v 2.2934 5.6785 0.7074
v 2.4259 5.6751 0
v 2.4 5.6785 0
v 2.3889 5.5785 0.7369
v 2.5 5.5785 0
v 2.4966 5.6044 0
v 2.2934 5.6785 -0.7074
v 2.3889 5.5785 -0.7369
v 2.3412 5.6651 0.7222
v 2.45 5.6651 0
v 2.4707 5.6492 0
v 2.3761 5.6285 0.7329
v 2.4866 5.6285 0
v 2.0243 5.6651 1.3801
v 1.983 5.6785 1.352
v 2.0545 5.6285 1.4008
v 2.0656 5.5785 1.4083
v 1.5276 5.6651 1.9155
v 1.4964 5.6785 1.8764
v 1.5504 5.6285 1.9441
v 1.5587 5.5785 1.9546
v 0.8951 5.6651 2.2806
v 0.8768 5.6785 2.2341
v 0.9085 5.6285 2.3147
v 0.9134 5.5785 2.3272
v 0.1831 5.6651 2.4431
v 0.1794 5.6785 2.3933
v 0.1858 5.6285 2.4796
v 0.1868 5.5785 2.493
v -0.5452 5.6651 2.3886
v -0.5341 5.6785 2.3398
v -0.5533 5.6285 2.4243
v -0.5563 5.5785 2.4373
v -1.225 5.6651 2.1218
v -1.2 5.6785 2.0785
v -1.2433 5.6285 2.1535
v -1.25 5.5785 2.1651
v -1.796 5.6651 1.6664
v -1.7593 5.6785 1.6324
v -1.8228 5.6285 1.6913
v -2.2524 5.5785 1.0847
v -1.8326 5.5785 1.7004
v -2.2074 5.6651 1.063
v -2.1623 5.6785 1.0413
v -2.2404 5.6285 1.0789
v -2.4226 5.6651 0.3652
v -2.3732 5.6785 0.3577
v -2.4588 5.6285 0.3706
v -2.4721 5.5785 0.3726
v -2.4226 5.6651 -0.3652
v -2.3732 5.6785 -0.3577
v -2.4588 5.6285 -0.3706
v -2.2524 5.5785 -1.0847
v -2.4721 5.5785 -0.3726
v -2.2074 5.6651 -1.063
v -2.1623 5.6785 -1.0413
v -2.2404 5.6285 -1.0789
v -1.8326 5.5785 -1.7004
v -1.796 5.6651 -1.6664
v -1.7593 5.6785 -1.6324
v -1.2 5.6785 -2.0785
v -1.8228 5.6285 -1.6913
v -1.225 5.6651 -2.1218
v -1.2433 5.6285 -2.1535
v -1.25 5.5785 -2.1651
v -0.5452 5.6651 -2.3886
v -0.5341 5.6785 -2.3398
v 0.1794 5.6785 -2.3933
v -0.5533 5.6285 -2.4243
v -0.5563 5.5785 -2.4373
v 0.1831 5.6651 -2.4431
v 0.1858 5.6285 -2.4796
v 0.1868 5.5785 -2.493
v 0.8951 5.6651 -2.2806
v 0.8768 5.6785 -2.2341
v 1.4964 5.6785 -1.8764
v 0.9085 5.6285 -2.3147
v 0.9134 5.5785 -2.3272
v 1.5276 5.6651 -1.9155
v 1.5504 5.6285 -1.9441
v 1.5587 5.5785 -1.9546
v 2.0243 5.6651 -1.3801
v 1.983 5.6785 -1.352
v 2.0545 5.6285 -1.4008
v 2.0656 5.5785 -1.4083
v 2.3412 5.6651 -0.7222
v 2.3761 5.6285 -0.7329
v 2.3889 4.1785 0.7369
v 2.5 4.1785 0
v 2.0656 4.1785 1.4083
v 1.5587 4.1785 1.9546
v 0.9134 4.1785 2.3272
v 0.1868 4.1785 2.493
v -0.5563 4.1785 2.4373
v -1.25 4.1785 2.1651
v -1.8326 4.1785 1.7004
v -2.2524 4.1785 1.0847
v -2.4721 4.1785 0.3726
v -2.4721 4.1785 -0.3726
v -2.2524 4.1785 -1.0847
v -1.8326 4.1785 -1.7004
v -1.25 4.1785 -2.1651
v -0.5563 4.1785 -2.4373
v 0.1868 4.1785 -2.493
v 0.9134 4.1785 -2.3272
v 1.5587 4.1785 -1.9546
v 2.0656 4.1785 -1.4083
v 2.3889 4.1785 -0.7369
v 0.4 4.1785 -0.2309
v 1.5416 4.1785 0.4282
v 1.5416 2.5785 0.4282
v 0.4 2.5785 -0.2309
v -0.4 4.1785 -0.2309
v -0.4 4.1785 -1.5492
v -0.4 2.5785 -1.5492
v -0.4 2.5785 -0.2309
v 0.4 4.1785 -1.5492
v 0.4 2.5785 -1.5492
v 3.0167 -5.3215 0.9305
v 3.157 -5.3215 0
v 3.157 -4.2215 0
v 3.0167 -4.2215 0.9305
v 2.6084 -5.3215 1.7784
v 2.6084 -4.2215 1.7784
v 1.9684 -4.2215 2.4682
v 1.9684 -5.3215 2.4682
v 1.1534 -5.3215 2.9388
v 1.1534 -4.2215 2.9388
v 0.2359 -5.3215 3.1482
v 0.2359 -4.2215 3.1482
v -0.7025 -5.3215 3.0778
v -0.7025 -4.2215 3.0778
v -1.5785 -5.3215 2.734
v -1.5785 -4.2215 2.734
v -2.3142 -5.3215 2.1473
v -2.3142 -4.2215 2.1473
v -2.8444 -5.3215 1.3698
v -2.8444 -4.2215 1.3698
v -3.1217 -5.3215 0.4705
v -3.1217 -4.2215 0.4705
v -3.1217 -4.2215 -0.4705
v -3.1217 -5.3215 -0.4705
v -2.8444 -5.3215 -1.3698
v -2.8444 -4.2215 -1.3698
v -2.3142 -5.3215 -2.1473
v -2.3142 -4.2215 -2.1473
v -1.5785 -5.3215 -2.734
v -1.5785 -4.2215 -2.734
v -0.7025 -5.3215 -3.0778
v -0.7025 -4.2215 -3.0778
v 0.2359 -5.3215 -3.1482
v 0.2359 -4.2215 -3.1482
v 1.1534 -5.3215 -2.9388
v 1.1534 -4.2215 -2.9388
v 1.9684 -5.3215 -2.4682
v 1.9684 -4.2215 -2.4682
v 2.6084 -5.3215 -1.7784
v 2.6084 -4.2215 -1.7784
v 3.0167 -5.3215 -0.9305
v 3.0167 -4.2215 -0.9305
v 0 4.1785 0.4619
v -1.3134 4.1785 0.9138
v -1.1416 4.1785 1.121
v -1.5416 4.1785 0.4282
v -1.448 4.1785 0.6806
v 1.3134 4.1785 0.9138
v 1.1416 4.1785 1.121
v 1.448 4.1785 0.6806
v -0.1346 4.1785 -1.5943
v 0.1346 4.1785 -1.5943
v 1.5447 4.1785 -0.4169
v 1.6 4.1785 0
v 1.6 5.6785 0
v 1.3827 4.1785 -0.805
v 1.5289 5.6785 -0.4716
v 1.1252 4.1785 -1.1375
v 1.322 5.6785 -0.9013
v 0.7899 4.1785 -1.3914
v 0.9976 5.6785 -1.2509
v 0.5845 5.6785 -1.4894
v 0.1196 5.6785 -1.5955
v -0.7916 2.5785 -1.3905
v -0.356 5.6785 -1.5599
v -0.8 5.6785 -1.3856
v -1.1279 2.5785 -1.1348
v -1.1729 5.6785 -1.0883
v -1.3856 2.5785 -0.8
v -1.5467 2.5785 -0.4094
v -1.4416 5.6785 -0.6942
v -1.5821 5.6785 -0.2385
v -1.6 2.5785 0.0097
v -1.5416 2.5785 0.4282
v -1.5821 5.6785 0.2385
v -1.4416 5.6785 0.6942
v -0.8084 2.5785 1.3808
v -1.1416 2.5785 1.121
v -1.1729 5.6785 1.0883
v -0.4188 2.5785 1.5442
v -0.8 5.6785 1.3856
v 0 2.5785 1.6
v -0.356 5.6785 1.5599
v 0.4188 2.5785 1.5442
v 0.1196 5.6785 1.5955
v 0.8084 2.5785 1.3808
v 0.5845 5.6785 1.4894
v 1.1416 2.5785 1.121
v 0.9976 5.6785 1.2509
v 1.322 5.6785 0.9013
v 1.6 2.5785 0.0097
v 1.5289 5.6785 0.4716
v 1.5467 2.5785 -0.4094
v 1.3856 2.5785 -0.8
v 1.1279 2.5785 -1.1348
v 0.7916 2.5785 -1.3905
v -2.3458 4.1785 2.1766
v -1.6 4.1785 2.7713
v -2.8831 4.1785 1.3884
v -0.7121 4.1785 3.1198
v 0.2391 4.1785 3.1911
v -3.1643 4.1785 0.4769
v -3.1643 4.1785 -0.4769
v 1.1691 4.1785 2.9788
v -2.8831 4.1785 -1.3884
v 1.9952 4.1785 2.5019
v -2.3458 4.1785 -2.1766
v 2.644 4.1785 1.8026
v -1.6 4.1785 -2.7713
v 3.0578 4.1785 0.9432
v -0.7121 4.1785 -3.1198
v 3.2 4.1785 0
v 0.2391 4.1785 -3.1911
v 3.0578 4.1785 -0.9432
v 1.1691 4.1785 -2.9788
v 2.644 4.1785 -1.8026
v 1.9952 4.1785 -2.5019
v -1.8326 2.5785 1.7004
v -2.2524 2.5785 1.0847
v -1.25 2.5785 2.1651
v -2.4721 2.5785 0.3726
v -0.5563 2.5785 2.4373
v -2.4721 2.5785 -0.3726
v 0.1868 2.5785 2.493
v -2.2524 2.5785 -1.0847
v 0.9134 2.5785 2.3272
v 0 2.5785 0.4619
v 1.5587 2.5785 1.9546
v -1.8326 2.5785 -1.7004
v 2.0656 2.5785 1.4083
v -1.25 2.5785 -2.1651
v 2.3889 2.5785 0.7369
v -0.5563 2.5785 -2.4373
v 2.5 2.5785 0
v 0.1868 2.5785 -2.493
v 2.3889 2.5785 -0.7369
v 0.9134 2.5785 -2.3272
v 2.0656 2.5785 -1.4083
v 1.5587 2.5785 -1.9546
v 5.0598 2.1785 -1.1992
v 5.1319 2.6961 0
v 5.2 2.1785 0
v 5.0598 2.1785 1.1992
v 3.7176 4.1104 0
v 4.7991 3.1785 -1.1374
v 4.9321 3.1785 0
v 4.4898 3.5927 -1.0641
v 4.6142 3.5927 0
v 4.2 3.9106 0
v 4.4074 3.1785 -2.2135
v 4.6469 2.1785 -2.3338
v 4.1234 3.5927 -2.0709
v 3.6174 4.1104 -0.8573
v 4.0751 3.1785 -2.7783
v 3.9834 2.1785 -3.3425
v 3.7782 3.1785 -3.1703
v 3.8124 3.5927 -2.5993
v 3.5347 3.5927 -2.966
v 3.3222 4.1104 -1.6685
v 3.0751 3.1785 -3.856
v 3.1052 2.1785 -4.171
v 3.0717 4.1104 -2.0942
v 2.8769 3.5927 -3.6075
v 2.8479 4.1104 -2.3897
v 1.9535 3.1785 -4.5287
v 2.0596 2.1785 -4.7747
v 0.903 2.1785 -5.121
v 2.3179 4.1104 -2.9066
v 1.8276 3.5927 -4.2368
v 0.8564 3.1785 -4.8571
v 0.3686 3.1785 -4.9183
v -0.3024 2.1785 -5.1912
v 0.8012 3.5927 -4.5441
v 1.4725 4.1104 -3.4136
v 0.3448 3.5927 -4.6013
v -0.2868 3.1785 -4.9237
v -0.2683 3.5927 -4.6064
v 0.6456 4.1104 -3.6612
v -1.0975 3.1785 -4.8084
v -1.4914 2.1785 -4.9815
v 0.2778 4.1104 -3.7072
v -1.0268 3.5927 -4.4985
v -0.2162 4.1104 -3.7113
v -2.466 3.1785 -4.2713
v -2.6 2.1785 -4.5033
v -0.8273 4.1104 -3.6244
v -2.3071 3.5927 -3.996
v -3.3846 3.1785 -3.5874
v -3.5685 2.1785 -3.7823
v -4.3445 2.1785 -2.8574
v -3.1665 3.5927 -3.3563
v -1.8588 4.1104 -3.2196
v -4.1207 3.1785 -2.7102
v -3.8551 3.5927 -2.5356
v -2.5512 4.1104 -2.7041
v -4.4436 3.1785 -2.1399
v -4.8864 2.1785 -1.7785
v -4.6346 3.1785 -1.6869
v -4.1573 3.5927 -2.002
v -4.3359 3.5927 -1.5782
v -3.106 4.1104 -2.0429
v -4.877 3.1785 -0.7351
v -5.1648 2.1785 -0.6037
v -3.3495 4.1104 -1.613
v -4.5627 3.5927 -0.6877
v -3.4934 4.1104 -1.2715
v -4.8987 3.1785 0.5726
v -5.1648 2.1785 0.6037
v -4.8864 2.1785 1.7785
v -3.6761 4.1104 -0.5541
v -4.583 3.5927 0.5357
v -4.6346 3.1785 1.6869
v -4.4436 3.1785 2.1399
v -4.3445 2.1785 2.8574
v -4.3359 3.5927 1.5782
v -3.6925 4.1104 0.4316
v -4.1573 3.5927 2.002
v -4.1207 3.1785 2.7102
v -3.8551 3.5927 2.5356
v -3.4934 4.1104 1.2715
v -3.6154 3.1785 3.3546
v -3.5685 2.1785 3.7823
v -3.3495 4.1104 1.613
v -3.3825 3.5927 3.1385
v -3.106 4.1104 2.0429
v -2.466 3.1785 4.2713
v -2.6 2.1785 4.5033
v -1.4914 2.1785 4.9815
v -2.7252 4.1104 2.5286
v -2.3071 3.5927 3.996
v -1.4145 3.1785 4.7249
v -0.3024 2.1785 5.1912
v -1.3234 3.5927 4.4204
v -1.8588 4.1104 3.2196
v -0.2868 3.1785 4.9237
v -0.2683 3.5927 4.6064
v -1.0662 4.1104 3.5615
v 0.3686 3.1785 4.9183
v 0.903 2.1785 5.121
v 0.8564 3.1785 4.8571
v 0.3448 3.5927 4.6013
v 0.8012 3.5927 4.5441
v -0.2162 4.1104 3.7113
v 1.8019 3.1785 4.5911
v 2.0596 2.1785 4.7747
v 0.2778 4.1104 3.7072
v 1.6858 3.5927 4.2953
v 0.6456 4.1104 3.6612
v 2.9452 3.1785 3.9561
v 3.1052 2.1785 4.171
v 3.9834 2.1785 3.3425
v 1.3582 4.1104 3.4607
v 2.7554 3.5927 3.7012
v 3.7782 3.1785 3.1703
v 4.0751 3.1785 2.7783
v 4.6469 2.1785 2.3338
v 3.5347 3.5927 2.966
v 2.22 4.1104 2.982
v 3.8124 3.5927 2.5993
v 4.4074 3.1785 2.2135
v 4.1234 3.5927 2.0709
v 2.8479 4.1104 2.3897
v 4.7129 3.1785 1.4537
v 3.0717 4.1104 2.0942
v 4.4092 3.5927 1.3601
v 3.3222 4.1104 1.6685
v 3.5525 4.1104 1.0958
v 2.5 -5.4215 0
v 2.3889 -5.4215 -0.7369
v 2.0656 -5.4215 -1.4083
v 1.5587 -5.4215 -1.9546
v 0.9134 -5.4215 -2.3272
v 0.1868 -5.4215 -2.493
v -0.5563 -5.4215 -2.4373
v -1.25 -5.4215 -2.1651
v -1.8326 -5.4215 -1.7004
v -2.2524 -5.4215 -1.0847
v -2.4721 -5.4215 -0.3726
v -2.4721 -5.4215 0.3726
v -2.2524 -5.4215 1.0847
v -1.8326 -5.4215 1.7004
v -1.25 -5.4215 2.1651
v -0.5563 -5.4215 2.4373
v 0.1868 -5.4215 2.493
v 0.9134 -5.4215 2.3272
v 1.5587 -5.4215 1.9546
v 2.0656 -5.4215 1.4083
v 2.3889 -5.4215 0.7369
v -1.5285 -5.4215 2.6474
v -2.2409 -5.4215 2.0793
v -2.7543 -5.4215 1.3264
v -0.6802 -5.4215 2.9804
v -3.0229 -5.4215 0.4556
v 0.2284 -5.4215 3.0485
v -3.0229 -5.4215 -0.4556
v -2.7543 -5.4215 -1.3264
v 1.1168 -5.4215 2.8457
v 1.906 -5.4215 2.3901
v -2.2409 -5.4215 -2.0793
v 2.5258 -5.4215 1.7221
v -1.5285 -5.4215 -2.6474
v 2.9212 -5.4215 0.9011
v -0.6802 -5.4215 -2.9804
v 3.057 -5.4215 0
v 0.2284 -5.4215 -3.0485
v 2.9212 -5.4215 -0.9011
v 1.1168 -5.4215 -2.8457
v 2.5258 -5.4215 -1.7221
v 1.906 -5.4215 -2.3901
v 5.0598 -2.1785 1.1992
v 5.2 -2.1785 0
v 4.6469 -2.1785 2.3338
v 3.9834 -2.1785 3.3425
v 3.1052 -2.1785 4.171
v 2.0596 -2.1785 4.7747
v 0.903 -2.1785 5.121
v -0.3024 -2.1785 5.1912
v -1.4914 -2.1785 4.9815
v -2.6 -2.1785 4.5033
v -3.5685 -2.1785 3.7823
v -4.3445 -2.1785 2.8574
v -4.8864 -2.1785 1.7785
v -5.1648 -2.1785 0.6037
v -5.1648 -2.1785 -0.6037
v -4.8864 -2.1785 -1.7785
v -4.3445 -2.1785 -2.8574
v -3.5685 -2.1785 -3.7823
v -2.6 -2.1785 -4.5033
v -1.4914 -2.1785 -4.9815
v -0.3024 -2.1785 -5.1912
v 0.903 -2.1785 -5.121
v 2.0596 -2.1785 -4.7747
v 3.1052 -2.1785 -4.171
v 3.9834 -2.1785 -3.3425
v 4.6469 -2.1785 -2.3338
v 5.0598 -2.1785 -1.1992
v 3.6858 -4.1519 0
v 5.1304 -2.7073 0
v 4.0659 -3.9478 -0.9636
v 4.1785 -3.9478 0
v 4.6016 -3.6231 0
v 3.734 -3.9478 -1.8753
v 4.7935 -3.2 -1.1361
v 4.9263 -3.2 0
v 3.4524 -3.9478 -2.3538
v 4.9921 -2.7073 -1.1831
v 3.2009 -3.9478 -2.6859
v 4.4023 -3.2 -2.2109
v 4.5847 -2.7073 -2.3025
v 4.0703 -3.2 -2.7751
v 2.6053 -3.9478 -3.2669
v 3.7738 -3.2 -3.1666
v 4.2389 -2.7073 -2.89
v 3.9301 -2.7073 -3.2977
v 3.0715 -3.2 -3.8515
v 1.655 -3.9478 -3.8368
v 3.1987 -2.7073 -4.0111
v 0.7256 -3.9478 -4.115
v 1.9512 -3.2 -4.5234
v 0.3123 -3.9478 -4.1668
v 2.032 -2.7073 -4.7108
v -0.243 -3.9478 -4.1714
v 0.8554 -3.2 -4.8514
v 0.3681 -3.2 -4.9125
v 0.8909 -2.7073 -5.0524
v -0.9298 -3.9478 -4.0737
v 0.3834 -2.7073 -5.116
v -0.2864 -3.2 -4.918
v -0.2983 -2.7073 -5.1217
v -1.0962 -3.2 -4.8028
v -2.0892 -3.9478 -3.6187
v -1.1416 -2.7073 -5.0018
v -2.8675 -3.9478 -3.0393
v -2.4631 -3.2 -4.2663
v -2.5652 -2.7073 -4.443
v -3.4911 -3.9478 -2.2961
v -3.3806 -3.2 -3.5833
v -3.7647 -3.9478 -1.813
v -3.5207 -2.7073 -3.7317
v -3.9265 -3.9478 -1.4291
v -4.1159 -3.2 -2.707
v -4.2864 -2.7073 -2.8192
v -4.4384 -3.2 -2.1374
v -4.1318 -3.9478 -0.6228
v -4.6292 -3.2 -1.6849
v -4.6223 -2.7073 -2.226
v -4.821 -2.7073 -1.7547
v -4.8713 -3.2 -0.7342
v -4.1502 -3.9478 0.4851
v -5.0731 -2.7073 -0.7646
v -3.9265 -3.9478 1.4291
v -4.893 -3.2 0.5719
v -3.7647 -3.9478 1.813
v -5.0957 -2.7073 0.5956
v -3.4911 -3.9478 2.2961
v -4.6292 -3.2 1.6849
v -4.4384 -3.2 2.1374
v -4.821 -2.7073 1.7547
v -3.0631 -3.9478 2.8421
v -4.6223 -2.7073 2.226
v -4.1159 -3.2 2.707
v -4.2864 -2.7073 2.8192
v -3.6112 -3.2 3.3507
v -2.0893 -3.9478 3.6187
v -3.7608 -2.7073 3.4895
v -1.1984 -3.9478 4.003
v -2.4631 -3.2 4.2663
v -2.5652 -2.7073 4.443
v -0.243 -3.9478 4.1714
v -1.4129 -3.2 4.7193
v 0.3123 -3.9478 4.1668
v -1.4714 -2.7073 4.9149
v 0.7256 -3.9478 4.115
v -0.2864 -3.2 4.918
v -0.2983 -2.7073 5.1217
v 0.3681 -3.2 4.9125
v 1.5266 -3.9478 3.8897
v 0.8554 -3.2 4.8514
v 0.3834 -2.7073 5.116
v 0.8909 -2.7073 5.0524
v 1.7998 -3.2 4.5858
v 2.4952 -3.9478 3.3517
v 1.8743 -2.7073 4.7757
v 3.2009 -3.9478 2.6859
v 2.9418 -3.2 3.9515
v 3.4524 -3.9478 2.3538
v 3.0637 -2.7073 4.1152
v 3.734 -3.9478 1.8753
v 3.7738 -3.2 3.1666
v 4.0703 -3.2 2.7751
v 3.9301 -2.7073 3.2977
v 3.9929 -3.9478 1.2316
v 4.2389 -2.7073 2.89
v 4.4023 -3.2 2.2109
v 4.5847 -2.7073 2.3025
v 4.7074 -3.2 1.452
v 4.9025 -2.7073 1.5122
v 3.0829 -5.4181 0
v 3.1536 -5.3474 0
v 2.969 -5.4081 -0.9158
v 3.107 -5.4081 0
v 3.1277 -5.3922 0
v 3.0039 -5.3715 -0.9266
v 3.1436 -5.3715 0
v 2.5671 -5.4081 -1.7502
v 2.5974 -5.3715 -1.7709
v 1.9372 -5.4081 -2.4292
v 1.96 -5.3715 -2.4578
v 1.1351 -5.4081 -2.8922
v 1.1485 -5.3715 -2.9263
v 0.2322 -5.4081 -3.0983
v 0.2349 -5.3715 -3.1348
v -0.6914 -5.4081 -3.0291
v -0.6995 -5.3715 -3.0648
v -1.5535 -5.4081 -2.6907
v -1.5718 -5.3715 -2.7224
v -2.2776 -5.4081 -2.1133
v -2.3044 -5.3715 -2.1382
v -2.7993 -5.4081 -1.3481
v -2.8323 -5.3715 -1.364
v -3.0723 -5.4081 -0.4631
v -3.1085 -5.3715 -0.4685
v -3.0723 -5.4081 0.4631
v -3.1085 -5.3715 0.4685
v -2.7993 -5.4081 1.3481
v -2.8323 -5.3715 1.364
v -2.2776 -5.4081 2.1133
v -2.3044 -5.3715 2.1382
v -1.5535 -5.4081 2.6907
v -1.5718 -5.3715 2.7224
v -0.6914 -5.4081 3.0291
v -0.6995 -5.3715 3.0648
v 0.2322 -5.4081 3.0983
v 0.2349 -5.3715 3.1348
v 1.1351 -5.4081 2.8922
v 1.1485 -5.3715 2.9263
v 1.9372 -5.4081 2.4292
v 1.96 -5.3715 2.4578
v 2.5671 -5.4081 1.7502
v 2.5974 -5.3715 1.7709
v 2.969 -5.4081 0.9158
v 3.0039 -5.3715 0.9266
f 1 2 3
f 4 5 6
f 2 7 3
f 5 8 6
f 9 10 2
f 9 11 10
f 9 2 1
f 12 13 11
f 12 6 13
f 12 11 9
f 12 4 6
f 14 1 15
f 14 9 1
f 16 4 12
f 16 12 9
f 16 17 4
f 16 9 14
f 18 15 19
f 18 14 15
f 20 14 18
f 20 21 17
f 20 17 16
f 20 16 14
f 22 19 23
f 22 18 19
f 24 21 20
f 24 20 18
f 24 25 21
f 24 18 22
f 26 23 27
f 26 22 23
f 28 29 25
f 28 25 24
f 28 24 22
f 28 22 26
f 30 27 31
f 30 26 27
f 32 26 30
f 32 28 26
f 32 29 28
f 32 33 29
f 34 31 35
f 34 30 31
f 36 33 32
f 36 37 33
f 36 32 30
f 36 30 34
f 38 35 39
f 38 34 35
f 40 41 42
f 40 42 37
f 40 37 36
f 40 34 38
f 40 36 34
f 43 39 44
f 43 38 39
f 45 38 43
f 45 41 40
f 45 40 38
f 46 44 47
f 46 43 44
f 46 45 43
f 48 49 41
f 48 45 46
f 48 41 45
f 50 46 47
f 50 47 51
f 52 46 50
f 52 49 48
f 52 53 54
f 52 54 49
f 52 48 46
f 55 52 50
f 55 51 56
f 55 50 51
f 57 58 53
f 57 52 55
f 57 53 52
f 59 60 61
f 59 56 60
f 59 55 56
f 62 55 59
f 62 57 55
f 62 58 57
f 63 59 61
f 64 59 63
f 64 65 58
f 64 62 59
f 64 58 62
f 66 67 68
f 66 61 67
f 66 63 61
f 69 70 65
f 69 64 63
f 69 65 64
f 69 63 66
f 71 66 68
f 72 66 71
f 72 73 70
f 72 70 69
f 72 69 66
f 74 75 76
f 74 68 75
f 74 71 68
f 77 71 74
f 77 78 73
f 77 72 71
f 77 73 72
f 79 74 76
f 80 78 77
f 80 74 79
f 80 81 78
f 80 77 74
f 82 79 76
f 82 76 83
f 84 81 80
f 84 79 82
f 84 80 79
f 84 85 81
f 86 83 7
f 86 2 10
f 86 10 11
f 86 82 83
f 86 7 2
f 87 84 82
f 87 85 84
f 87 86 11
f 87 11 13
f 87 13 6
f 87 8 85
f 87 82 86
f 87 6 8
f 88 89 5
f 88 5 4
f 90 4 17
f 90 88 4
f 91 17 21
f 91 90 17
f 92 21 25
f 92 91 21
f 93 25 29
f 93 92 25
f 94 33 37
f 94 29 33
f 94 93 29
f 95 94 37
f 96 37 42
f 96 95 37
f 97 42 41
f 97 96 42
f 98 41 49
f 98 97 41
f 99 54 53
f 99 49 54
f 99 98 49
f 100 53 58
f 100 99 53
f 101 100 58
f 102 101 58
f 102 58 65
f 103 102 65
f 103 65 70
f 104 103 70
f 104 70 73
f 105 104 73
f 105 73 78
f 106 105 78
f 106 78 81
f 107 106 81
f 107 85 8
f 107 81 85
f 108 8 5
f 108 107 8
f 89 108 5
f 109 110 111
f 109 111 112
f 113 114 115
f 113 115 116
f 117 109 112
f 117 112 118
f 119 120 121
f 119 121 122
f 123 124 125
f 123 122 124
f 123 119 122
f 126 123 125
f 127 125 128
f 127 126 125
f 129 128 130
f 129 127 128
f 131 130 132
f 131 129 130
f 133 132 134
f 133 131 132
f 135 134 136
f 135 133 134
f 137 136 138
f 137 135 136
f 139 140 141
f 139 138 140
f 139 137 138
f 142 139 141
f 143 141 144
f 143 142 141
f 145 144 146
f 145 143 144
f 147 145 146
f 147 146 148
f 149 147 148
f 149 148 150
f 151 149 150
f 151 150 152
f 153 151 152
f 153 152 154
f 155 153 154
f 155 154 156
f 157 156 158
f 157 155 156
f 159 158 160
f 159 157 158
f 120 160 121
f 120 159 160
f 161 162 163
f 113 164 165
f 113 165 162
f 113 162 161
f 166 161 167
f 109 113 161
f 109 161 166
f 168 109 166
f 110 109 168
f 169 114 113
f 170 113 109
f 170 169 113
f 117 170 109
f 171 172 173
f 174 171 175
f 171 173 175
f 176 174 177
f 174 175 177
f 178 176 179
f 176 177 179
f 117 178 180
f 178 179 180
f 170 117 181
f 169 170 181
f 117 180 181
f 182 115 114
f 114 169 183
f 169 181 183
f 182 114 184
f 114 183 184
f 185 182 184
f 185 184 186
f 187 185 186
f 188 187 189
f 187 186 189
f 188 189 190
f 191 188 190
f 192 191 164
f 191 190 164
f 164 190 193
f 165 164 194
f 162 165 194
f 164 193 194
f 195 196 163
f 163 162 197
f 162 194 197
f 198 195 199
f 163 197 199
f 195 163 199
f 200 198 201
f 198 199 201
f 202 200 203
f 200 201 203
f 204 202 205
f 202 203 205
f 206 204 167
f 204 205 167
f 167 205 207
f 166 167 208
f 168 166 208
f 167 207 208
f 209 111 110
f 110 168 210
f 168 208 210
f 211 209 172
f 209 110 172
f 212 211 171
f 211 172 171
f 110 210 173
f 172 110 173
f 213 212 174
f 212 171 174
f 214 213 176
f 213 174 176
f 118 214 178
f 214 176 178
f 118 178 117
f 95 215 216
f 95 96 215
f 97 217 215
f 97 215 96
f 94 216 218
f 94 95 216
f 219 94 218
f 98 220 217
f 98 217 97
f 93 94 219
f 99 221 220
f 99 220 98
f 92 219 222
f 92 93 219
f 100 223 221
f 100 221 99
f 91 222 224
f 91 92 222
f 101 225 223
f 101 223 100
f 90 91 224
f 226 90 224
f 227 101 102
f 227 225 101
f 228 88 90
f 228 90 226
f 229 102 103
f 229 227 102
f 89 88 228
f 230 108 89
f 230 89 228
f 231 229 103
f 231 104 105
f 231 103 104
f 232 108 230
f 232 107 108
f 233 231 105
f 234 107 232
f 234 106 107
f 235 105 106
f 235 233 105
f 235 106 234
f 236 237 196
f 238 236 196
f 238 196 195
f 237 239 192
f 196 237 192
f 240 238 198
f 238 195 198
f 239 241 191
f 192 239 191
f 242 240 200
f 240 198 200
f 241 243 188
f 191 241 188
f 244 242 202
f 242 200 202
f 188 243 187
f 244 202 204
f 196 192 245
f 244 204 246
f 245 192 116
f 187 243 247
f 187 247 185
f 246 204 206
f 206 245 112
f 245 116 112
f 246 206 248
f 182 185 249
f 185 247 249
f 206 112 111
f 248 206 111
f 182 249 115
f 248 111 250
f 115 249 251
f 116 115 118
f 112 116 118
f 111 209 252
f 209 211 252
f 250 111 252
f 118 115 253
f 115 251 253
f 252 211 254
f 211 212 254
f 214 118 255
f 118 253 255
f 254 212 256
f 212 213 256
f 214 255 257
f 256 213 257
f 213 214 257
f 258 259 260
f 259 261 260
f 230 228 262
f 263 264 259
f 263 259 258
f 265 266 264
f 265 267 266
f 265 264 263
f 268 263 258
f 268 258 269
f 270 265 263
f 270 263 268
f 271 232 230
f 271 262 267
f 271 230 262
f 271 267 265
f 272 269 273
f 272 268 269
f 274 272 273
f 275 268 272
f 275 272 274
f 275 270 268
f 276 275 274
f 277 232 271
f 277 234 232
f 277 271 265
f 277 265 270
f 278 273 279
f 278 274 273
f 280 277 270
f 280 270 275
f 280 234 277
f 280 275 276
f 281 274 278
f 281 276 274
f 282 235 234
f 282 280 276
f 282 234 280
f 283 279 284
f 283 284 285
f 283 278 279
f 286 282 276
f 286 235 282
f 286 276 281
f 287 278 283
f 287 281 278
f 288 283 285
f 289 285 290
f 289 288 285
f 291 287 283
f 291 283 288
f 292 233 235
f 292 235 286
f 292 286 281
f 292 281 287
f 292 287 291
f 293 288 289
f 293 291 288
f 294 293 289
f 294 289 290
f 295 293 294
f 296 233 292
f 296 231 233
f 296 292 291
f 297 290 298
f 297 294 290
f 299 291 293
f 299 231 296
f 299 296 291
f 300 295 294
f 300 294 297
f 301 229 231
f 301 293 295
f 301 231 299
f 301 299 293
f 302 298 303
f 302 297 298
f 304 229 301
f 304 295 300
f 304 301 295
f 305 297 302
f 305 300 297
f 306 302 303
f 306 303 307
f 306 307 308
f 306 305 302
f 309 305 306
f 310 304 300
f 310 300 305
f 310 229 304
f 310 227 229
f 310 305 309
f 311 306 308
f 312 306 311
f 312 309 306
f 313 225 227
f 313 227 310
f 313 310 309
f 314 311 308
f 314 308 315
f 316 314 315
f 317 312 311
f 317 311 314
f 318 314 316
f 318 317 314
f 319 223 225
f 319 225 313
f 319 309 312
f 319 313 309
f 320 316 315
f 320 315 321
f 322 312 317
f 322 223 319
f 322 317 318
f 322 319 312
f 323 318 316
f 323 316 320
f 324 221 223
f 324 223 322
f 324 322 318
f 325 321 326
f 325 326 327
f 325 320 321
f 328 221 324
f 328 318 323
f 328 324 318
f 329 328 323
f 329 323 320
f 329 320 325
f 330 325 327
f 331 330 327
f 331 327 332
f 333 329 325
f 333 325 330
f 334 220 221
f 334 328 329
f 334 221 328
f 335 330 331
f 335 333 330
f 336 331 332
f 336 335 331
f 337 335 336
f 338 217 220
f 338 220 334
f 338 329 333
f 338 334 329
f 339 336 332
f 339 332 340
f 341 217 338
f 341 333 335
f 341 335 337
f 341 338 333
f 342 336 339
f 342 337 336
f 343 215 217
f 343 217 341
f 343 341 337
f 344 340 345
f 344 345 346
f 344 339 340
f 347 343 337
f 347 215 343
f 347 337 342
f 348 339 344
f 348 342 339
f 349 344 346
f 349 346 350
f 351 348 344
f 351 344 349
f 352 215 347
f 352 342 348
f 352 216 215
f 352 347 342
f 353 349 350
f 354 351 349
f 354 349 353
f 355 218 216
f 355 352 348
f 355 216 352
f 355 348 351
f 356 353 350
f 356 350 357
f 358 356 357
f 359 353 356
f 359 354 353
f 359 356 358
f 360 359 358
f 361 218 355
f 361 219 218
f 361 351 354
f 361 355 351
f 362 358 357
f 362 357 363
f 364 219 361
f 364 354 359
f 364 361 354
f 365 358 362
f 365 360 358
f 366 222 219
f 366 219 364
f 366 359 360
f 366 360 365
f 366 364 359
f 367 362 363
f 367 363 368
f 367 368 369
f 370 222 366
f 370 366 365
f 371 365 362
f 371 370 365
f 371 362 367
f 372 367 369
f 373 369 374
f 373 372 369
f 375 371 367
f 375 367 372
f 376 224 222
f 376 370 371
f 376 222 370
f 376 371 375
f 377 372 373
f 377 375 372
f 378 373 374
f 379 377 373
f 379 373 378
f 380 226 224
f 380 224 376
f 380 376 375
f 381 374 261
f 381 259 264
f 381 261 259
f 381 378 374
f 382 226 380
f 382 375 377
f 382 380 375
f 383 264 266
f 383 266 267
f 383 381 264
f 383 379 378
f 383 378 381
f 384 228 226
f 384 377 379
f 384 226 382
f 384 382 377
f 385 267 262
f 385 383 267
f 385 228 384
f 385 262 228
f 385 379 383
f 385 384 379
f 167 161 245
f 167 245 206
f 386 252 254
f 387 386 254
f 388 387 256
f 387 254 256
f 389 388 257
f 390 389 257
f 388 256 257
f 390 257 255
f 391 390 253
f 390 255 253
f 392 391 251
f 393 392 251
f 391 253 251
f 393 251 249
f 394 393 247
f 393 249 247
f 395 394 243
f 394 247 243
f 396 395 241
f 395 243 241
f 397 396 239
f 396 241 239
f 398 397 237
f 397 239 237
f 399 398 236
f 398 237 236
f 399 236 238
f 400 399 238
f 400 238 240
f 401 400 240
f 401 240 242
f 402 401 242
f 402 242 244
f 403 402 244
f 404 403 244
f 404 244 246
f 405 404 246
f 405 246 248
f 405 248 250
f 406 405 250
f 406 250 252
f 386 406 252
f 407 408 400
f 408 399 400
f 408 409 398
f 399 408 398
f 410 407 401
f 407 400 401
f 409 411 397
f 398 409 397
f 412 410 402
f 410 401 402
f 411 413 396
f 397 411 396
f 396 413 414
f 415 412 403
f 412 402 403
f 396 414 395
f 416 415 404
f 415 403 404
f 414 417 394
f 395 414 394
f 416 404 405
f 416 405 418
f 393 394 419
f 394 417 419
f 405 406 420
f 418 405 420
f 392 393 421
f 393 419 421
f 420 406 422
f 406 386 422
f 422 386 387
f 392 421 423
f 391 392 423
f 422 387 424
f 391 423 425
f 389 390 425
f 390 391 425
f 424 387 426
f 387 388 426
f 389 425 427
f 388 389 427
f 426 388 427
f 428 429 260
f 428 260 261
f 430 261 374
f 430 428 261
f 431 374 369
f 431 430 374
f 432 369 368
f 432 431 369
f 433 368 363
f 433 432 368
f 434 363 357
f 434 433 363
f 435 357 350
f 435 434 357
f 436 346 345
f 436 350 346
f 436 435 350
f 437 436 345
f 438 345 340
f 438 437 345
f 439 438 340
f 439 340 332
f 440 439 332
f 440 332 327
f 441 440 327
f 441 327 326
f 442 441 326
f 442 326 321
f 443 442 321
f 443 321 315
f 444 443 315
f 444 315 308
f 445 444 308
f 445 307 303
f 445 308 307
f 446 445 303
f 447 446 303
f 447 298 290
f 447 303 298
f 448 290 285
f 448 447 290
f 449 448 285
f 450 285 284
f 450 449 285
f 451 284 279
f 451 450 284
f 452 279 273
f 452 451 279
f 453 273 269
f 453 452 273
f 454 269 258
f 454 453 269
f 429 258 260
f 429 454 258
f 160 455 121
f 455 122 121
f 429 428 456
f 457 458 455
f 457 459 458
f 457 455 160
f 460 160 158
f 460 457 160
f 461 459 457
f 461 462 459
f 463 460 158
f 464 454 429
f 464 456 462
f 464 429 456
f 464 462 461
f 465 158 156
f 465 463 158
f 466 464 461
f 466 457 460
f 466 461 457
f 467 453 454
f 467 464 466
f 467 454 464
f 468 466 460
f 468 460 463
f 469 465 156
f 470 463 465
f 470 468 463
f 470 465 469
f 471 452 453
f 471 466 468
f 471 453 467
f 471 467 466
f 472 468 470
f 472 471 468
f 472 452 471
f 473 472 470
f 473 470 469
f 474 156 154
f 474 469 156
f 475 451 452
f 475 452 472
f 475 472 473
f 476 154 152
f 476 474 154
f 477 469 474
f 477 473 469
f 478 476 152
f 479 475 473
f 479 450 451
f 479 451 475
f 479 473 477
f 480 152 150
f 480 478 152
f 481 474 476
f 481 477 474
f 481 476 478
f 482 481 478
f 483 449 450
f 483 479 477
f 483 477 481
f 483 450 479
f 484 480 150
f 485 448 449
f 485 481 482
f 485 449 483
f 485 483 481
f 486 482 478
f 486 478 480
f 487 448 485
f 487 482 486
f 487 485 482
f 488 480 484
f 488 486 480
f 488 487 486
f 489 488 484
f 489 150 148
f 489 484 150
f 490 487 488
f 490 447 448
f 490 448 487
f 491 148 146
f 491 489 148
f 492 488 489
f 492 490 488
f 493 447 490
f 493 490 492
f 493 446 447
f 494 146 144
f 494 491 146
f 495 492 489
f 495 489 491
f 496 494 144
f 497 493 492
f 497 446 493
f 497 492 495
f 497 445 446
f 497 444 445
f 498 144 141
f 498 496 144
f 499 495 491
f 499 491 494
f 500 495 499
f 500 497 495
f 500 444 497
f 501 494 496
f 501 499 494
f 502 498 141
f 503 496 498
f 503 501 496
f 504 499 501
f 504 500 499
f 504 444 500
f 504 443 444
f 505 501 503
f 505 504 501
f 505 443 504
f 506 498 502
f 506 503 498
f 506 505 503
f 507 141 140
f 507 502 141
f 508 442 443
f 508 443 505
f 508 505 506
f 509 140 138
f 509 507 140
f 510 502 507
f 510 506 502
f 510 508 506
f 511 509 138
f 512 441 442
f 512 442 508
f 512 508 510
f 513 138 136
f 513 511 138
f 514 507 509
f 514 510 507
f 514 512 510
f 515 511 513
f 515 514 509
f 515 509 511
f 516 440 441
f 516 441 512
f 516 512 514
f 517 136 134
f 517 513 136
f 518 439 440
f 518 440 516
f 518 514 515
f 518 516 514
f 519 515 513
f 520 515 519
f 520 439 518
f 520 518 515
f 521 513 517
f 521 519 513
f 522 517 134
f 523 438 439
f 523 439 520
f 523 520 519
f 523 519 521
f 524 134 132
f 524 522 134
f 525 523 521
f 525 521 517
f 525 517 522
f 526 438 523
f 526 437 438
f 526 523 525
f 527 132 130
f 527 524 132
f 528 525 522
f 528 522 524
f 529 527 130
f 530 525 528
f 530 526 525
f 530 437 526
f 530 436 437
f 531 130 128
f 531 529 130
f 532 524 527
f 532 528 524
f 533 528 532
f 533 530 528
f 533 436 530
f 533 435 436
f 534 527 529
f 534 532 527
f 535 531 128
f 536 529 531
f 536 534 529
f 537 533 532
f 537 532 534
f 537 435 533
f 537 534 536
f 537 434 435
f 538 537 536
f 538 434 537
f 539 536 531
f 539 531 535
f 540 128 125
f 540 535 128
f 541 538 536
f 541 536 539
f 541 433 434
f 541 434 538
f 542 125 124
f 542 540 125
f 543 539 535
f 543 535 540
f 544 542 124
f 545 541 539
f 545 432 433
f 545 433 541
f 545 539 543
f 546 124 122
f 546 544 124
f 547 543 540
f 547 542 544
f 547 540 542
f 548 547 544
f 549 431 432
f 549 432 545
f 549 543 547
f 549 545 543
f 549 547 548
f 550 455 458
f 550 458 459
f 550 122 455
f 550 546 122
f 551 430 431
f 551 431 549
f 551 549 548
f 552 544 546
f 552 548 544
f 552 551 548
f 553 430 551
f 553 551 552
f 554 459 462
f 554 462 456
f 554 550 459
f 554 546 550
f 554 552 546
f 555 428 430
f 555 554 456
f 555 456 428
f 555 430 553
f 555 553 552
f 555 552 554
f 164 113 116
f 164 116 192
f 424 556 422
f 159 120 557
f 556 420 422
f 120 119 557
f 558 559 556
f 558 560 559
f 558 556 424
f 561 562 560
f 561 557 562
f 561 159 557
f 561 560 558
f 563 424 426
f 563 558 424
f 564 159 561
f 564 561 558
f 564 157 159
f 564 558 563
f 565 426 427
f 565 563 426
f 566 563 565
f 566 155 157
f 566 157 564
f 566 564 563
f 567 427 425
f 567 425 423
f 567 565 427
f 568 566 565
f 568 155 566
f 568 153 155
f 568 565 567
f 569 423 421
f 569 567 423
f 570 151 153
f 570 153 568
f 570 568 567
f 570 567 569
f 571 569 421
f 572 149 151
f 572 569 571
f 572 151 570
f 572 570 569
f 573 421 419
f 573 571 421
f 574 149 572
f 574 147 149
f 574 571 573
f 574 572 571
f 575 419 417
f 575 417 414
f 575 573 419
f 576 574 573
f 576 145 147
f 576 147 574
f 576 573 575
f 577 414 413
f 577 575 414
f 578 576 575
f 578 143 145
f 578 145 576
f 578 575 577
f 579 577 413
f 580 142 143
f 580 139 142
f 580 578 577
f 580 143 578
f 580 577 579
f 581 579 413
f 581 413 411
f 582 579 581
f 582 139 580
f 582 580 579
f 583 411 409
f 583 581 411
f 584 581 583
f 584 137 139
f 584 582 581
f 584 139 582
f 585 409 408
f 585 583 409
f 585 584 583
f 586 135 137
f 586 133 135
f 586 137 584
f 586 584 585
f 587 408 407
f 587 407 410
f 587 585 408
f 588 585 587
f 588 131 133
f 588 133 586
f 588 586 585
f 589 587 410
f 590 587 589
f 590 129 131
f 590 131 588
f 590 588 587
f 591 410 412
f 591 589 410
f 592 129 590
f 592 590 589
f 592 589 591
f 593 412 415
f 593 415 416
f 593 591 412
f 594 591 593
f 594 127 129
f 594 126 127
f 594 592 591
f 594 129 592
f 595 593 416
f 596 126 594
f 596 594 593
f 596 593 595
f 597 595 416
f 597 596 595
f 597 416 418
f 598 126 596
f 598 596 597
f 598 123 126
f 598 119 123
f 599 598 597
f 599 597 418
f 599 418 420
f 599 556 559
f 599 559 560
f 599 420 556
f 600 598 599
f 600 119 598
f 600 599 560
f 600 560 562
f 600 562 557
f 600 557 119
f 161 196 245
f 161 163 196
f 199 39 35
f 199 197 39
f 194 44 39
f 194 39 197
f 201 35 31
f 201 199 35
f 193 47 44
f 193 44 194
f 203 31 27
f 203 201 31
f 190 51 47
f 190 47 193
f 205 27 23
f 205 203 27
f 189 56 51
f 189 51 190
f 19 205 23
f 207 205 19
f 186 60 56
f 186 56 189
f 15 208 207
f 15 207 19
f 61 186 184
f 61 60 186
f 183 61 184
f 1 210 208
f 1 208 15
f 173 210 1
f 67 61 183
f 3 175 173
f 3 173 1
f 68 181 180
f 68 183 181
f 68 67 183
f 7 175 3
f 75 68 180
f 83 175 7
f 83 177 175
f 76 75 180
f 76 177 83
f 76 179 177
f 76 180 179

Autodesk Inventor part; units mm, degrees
ref_plane "XZ Plane" through (0, 0, 0) normal (0, 1, 0) x (-1, 0, 0)
sketch "Sketch2" plane through (0, 0, 0) normal (0, 0, 1) x (1, 0, 0)
  line L0 (0, 4.1785) -> (1.6, 4.1785)
  line L1 (1.6, 4.1785) -> (1.6, 5.6785)
  line L2 (1.6, 5.6785) -> (2.5, 5.6785)
  line L3 (2.5, 5.6785) -> (2.5, 4.1785)
  line L4 (2.5, 4.1785) -> (3.2, 4.1785)
  arc A0 (5.2, 2.1785) -> (3.2, 4.1785) centre (3.2, 2.1785) ccw
  line L5 (5.2, 2.1785) -> (5.2, -2.1785)
  arc A1 (3.157, -4.2215) -> (5.2, -2.1785) centre (3.157, -2.1785) ccw
  line L6 (3.157, -4.2215) -> (3.157, -5.4215)
  line L7 (3.157, -5.4215) -> (2.5, -5.4215)
  line L8 (2.5, -5.4215) -> (2.5, 2.5785)
  line L9 (2.5, 2.5785) -> (0, 2.5785)
  line L10 (0, 2.5785) -> (0, 4.1785)
  point P0 (0, 0)
  point P1 (5.2, 0)
  dimension "d0" = 5
  dimension "d1" = 3.2
  dimension "d2" = 1.5
  dimension "d3" = 2
  dimension "d4" = 10.4
  dimension "d6" = 6.314
  dimension "d7" = 1.2
  dimension "d8" = 8
  dimension "d23" = 9.6
revolve "Revolution1" add sketch "Sketch2" angle 360 about axis through (0, 2.5785, 0) along (0, 1, 0)
sketch "Sketch3" plane through (0, 4.1785, 0) normal (0, 1, 0) x (1, 0, 0)
  circle A0 centre (0, 0) radius 1.6 projected
  line L0 (-0.4, 1.5492) -> (-0.4, 0.2309)
  line L1 (-0.4, 0.2309) -> (-1.5416, -0.4282)
  line L2 (-1.1416, -1.121) -> (0, -0.4619)
  line L3 (0, -0.4619) -> (1.1416, -1.121)
  line L4 (1.5416, -0.4282) -> (0.4, 0.2309)
  line L5 (0.4, 0.2309) -> (0.4, 1.5492)
  dimension "d10" = 120
  dimension "d11" = 0.8
extrude "Extrusion1" cut sketch "Sketch3" against normal through all contours A0 L4 L5 | L0 L1 A0 | A0 L2 L3
fillet "Fillet1" radius 0.1 2 edges at (-2.5, 5.6785, 0) (-3.157, -5.4215, 0)
ref_plane "Work Plane1" through (5.2, 0, 0) normal (1, 0, 0) x (0, 1, 0)
ref_plane "Work Plane2" through (0, 0, 5.2) normal (0, 0, 1) x (1, 0, 0)
sketch "Sketch5" plane through (0, 0, 5.2) normal (0, 0, 1) x (1, 0, 0)
  line L0 (-5.2, 2.1785) -> (5.2, 2.1785) construction
  line L1 (-5.2, -2.1785) -> (5.2, -2.1785) construction
  line L2 (-5.8921, 2.1785) -> (5.8921, 2.1785) construction
  line L3 (5.8921, 2.1785) -> (5.8921, -2.1785) construction
  line L4 (5.8921, -2.1785) -> (-5.8921, -2.1785) construction
  line L5 (-5.8921, -2.1785) -> (-5.8921, 2.1785) construction
  point P0 (0, 0)
  point P1 (0, 2.1785)
decal "Decal2"
properties part number "X02598_LEGOmini_Head_Y_Original_NoPara" material "ABS Plastic"
